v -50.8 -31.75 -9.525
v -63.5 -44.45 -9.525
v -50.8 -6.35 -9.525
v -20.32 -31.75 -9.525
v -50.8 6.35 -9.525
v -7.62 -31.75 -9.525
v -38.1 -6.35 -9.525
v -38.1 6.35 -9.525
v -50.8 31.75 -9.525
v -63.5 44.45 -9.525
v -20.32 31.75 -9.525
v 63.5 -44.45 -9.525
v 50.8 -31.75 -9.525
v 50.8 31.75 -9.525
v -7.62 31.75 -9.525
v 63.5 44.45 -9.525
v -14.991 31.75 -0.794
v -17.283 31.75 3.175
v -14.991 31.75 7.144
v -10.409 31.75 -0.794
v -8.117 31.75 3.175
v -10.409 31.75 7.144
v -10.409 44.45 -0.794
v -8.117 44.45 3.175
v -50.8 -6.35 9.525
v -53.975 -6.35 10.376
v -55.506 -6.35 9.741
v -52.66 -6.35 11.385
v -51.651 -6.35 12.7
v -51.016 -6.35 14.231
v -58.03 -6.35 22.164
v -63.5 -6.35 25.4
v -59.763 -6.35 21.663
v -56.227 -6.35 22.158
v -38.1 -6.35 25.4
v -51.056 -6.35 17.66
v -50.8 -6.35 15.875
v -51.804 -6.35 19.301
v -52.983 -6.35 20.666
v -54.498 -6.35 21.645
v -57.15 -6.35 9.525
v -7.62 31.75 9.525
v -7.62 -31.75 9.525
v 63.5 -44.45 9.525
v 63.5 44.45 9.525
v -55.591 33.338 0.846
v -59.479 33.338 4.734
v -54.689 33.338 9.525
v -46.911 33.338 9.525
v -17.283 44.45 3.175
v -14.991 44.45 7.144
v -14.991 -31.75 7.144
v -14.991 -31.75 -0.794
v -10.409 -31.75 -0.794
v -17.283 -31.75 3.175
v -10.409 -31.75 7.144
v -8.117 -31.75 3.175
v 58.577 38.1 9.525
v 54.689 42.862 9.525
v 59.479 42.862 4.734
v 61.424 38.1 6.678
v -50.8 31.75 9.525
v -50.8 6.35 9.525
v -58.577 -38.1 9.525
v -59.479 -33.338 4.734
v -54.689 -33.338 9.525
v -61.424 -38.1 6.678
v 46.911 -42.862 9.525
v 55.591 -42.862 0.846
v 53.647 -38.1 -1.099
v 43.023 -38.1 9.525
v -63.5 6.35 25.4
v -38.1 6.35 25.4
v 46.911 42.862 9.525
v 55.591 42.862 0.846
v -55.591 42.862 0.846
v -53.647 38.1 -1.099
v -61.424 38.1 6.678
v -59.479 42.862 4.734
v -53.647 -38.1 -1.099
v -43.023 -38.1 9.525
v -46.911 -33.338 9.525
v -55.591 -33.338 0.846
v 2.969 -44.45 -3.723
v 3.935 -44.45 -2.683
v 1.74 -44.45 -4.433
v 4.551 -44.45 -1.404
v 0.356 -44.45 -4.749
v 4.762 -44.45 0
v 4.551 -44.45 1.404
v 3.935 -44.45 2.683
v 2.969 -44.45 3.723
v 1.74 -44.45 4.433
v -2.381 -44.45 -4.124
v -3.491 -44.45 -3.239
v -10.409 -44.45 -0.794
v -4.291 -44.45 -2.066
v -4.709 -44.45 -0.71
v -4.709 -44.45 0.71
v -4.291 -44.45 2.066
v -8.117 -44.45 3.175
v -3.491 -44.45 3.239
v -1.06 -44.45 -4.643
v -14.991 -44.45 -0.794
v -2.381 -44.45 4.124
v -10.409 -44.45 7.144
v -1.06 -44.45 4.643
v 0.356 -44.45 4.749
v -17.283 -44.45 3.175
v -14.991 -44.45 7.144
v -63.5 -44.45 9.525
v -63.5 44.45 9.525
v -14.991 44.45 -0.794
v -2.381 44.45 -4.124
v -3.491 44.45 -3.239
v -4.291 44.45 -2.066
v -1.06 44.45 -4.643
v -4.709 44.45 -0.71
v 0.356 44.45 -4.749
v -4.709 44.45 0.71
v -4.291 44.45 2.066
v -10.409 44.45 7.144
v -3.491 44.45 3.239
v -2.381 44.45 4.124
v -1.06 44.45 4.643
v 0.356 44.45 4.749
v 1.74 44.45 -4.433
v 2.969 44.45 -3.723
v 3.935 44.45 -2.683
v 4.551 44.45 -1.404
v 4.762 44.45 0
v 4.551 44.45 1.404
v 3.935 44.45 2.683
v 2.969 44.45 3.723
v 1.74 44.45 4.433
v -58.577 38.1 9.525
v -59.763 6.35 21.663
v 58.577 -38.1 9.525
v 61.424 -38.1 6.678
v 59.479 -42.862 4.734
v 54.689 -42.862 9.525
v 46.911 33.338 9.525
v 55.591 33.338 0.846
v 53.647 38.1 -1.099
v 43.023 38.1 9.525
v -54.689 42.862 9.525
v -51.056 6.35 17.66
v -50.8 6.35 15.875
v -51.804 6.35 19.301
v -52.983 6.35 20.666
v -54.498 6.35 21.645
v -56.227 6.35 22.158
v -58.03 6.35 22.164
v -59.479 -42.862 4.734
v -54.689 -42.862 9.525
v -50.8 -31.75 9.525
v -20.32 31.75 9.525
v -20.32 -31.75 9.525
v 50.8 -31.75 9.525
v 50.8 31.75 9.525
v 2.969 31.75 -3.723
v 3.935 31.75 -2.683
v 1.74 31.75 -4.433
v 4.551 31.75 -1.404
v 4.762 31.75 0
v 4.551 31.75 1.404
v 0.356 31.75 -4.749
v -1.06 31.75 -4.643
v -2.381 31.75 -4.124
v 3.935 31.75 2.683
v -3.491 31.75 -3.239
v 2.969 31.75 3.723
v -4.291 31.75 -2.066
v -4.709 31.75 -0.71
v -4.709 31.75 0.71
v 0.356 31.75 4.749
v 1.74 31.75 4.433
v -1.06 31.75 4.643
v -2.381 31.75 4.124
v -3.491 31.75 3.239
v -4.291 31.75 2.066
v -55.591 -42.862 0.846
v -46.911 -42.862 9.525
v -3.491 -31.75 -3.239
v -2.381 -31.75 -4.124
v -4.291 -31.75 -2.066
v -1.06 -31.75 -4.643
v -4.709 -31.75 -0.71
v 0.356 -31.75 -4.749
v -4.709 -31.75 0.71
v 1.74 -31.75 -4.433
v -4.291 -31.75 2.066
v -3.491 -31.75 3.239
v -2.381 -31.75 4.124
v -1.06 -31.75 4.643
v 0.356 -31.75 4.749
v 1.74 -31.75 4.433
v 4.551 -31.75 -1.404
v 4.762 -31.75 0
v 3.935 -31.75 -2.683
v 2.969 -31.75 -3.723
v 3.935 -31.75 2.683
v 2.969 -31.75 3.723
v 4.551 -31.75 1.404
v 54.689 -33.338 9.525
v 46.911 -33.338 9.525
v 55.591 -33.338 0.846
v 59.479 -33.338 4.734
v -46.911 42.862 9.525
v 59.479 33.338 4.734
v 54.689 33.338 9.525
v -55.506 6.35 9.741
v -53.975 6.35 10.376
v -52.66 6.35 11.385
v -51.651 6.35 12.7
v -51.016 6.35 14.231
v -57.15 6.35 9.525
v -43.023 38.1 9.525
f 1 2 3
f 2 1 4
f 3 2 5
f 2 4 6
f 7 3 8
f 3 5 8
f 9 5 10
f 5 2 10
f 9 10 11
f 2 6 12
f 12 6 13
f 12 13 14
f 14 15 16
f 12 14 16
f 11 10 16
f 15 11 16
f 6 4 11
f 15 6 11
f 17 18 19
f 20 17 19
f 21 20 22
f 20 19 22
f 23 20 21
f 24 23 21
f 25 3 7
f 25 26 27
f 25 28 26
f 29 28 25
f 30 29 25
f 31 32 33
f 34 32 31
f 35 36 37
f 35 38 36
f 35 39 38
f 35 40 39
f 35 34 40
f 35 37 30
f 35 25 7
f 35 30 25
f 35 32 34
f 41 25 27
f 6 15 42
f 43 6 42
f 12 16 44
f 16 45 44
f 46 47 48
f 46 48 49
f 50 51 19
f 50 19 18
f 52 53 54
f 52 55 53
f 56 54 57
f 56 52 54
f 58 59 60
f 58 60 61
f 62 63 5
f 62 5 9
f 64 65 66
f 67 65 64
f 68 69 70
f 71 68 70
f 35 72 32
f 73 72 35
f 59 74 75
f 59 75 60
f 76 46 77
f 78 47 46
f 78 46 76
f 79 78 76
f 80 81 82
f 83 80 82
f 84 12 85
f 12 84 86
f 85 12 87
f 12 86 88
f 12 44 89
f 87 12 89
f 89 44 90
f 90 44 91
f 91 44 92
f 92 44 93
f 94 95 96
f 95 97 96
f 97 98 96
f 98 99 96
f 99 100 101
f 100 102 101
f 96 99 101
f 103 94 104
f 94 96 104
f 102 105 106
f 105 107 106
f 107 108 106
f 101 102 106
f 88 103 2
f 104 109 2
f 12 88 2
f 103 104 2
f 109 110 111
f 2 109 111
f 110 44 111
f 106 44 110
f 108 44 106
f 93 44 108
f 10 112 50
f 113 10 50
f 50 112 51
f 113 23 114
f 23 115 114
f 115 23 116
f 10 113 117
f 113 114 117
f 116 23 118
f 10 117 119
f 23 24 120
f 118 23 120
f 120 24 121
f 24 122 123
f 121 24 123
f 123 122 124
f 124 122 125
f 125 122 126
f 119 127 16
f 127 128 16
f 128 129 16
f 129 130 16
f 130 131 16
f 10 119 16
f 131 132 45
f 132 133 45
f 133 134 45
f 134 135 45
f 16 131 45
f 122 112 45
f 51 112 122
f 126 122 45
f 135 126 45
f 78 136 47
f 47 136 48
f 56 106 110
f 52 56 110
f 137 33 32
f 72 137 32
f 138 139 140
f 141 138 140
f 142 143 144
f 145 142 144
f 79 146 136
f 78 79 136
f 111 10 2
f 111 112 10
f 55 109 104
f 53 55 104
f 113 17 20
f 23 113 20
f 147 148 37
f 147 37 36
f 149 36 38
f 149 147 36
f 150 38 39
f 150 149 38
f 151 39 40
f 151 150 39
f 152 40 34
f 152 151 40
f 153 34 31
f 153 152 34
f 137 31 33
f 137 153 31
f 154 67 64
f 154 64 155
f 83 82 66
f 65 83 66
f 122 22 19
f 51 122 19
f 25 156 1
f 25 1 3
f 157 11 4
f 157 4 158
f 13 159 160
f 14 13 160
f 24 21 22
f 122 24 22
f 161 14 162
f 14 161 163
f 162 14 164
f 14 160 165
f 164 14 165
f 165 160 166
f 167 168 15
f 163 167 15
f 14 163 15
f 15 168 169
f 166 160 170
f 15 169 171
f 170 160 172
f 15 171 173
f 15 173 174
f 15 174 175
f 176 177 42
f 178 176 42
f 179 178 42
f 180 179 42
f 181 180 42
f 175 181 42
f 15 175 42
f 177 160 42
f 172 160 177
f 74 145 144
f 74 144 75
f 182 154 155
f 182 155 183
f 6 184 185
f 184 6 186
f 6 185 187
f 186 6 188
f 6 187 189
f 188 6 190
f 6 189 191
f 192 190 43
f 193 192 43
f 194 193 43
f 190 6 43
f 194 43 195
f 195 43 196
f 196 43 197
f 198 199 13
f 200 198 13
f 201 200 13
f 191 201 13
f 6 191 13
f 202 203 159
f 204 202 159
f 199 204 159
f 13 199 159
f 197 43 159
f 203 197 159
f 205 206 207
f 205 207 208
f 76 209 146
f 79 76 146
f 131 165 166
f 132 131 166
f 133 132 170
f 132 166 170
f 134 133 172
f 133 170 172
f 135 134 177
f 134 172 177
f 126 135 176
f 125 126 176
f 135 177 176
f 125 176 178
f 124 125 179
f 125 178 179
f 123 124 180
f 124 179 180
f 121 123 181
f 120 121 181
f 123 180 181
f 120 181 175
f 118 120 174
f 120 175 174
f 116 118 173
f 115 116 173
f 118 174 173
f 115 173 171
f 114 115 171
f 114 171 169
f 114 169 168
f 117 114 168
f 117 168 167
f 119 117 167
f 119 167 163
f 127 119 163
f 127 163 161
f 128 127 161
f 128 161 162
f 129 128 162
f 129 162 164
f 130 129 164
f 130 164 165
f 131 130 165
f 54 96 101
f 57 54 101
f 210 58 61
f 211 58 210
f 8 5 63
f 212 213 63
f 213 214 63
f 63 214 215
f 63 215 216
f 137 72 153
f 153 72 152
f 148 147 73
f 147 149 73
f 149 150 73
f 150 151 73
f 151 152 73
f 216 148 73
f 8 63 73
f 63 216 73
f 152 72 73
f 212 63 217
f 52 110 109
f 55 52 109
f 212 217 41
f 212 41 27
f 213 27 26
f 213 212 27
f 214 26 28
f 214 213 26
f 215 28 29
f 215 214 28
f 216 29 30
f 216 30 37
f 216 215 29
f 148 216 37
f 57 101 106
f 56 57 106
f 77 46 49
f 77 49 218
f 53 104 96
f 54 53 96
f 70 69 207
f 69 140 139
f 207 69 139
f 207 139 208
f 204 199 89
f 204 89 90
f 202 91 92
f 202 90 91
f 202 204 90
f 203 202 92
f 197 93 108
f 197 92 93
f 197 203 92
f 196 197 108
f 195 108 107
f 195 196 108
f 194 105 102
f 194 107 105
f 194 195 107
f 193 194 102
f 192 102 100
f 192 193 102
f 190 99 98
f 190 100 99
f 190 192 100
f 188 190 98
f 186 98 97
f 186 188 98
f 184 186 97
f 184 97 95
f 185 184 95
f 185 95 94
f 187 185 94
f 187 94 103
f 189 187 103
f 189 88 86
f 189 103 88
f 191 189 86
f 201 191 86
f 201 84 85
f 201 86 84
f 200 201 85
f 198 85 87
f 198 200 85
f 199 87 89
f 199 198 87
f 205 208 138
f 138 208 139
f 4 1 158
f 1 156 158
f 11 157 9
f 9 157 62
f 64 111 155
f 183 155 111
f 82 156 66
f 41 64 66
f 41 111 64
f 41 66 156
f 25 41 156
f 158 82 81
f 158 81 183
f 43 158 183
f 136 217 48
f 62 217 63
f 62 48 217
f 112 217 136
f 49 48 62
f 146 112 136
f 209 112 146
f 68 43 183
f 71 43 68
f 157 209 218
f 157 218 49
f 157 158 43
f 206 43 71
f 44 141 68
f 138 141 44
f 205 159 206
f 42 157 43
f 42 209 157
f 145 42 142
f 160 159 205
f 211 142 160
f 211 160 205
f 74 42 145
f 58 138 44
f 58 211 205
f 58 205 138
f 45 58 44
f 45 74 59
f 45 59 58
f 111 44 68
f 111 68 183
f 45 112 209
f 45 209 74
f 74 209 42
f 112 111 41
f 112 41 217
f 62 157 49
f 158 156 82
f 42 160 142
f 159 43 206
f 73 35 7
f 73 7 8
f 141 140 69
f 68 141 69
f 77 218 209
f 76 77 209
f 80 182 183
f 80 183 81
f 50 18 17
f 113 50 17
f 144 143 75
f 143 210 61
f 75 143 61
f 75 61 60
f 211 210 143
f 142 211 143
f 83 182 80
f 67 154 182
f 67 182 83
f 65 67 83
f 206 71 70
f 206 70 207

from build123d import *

# Parameters (mm, degrees)
F1_DEPTH  = 9.525
F6_DEPTH  = 9.525
F2_R      = 4.7625
F8_DEPTH  = 80.01
F9_W      = 12.7
F9_H      = 19.05
F10_DEPTH = 63.5
F0_W      = 12.7
F0_H      = 12.7
F11_DEPTH = 25.4
F13_DEPTH = 12.7
F14_DEPTH = 9.525


with BuildPart() as f1:
    # F0 (on Top) → F1 (new body, symmetric)
    with BuildSketch(Plane.XY):
        Polygon((-63.5, -44.45), (0, -44.45), (0, -31.75), (-50.8, -31.75), (-50.8, -6.35), (-50.8, 6.35), (-50.8, 31.75), (0, 31.75), (0, 44.45), (-63.5, 44.45), align=None)
    extrude(amount=F1_DEPTH, both=True)

    # F5 (on line) → F6 (cut, symmetric)
    with BuildSketch(Plane(origin=(-20.6375, 0, -20.6375), x_dir=(0, 1, 0), z_dir=(0.7071067812, 0, 0.7071067812))):
        Polygon((-42.8625, 39.9065859181), (-38.1, 37.156955261), (-33.3375, 39.9065859181), (-33.3375, 45.4058472321), (-38.1, 48.1554778891), (-42.8625, 45.4058472321), align=None)
        Polygon((33.3375, 39.9065859181), (38.1, 37.156955261), (42.8625, 39.9065859181), (42.8625, 45.4058472321), (38.1, 48.1554778891), (33.3375, 45.4058472321), align=None)
    extrude(amount=F6_DEPTH, both=True, mode=Mode.SUBTRACT)

    # F7: F1 across plane


with BuildPart() as f1_1:
    add(f1.part)
    add(f1.part.mirror(Plane.YZ))

    # F2 (on Front) → F8 (cut, symmetric)
    with BuildSketch(Plane.XZ):
        Circle(F2_R)
        Polygon((-10.4086411192, -0.79375), (-8.1172822383, 3.175), (-10.4086411192, 7.14375), (-14.9913588808, 7.14375), (-17.2827177617, 3.175), (-14.9913588808, -0.79375), align=None)
    extrude(amount=F8_DEPTH, both=True, mode=Mode.SUBTRACT)

    # F9 (on face) → F10 (join)
    with BuildSketch(Plane.XZ.offset(-31.75)):
        with Locations((-13.97, 0)):
            Rectangle(F9_W, F9_H)
        Polygon((-14.9913588808, -0.79375), (-17.2827177617, 3.175), (-14.9913588808, 7.14375), (-10.4086411192, 7.14375), (-8.1172822383, 3.175), (-10.4086411192, -0.79375), align=None, mode=Mode.SUBTRACT)
        Polygon((-14.9913588808, 7.14375), (-17.2827177617, 3.175), (-14.9913588808, -0.79375), (-10.4086411192, -0.79375), (-8.1172822383, 3.175), (-10.4086411192, 7.14375), align=None)
    extrude(amount=F10_DEPTH)

    # F0 (on Top) → F11 (join)
    with BuildSketch(Plane.XY):
        with Locations((-44.45, 0)):
            Rectangle(F0_W, F0_H)
    extrude(amount=F11_DEPTH)

    # F12 (on face) → F13 (join)
    with BuildSketch(Plane(origin=(0, 6.35, 0), x_dir=(-1, 0, 0), z_dir=(0, 1, 0))):
        with BuildLine():
            Line((50.8, 15.875), (50.8, 9.525))
            Line((50.8, 9.525), (57.15, 9.525))
            ThreePointArc((57.15, 9.525), (52.6598719395, 11.3848719395), (50.8, 15.875))
        make_face()
        with BuildLine():
            Line((50.8, 25.4), (50.8, 15.875))
            ThreePointArc((50.8, 15.875), (53.7052722756, 21.2094494472), (59.7626302063, 21.6626302063))
            Line((59.7626302063, 21.6626302063), (63.5, 25.4))
            Line((63.5, 25.4), (50.8, 25.4))
        make_face()
    extrude(amount=-F13_DEPTH)

    # F0 (on Top) → F14 (join)
    with BuildSketch(Plane.XY):
        with Locations((-44.45, 0)):
            Rectangle(F0_W, F0_H)
    extrude(amount=-F14_DEPTH)


solid = f1_1.part
